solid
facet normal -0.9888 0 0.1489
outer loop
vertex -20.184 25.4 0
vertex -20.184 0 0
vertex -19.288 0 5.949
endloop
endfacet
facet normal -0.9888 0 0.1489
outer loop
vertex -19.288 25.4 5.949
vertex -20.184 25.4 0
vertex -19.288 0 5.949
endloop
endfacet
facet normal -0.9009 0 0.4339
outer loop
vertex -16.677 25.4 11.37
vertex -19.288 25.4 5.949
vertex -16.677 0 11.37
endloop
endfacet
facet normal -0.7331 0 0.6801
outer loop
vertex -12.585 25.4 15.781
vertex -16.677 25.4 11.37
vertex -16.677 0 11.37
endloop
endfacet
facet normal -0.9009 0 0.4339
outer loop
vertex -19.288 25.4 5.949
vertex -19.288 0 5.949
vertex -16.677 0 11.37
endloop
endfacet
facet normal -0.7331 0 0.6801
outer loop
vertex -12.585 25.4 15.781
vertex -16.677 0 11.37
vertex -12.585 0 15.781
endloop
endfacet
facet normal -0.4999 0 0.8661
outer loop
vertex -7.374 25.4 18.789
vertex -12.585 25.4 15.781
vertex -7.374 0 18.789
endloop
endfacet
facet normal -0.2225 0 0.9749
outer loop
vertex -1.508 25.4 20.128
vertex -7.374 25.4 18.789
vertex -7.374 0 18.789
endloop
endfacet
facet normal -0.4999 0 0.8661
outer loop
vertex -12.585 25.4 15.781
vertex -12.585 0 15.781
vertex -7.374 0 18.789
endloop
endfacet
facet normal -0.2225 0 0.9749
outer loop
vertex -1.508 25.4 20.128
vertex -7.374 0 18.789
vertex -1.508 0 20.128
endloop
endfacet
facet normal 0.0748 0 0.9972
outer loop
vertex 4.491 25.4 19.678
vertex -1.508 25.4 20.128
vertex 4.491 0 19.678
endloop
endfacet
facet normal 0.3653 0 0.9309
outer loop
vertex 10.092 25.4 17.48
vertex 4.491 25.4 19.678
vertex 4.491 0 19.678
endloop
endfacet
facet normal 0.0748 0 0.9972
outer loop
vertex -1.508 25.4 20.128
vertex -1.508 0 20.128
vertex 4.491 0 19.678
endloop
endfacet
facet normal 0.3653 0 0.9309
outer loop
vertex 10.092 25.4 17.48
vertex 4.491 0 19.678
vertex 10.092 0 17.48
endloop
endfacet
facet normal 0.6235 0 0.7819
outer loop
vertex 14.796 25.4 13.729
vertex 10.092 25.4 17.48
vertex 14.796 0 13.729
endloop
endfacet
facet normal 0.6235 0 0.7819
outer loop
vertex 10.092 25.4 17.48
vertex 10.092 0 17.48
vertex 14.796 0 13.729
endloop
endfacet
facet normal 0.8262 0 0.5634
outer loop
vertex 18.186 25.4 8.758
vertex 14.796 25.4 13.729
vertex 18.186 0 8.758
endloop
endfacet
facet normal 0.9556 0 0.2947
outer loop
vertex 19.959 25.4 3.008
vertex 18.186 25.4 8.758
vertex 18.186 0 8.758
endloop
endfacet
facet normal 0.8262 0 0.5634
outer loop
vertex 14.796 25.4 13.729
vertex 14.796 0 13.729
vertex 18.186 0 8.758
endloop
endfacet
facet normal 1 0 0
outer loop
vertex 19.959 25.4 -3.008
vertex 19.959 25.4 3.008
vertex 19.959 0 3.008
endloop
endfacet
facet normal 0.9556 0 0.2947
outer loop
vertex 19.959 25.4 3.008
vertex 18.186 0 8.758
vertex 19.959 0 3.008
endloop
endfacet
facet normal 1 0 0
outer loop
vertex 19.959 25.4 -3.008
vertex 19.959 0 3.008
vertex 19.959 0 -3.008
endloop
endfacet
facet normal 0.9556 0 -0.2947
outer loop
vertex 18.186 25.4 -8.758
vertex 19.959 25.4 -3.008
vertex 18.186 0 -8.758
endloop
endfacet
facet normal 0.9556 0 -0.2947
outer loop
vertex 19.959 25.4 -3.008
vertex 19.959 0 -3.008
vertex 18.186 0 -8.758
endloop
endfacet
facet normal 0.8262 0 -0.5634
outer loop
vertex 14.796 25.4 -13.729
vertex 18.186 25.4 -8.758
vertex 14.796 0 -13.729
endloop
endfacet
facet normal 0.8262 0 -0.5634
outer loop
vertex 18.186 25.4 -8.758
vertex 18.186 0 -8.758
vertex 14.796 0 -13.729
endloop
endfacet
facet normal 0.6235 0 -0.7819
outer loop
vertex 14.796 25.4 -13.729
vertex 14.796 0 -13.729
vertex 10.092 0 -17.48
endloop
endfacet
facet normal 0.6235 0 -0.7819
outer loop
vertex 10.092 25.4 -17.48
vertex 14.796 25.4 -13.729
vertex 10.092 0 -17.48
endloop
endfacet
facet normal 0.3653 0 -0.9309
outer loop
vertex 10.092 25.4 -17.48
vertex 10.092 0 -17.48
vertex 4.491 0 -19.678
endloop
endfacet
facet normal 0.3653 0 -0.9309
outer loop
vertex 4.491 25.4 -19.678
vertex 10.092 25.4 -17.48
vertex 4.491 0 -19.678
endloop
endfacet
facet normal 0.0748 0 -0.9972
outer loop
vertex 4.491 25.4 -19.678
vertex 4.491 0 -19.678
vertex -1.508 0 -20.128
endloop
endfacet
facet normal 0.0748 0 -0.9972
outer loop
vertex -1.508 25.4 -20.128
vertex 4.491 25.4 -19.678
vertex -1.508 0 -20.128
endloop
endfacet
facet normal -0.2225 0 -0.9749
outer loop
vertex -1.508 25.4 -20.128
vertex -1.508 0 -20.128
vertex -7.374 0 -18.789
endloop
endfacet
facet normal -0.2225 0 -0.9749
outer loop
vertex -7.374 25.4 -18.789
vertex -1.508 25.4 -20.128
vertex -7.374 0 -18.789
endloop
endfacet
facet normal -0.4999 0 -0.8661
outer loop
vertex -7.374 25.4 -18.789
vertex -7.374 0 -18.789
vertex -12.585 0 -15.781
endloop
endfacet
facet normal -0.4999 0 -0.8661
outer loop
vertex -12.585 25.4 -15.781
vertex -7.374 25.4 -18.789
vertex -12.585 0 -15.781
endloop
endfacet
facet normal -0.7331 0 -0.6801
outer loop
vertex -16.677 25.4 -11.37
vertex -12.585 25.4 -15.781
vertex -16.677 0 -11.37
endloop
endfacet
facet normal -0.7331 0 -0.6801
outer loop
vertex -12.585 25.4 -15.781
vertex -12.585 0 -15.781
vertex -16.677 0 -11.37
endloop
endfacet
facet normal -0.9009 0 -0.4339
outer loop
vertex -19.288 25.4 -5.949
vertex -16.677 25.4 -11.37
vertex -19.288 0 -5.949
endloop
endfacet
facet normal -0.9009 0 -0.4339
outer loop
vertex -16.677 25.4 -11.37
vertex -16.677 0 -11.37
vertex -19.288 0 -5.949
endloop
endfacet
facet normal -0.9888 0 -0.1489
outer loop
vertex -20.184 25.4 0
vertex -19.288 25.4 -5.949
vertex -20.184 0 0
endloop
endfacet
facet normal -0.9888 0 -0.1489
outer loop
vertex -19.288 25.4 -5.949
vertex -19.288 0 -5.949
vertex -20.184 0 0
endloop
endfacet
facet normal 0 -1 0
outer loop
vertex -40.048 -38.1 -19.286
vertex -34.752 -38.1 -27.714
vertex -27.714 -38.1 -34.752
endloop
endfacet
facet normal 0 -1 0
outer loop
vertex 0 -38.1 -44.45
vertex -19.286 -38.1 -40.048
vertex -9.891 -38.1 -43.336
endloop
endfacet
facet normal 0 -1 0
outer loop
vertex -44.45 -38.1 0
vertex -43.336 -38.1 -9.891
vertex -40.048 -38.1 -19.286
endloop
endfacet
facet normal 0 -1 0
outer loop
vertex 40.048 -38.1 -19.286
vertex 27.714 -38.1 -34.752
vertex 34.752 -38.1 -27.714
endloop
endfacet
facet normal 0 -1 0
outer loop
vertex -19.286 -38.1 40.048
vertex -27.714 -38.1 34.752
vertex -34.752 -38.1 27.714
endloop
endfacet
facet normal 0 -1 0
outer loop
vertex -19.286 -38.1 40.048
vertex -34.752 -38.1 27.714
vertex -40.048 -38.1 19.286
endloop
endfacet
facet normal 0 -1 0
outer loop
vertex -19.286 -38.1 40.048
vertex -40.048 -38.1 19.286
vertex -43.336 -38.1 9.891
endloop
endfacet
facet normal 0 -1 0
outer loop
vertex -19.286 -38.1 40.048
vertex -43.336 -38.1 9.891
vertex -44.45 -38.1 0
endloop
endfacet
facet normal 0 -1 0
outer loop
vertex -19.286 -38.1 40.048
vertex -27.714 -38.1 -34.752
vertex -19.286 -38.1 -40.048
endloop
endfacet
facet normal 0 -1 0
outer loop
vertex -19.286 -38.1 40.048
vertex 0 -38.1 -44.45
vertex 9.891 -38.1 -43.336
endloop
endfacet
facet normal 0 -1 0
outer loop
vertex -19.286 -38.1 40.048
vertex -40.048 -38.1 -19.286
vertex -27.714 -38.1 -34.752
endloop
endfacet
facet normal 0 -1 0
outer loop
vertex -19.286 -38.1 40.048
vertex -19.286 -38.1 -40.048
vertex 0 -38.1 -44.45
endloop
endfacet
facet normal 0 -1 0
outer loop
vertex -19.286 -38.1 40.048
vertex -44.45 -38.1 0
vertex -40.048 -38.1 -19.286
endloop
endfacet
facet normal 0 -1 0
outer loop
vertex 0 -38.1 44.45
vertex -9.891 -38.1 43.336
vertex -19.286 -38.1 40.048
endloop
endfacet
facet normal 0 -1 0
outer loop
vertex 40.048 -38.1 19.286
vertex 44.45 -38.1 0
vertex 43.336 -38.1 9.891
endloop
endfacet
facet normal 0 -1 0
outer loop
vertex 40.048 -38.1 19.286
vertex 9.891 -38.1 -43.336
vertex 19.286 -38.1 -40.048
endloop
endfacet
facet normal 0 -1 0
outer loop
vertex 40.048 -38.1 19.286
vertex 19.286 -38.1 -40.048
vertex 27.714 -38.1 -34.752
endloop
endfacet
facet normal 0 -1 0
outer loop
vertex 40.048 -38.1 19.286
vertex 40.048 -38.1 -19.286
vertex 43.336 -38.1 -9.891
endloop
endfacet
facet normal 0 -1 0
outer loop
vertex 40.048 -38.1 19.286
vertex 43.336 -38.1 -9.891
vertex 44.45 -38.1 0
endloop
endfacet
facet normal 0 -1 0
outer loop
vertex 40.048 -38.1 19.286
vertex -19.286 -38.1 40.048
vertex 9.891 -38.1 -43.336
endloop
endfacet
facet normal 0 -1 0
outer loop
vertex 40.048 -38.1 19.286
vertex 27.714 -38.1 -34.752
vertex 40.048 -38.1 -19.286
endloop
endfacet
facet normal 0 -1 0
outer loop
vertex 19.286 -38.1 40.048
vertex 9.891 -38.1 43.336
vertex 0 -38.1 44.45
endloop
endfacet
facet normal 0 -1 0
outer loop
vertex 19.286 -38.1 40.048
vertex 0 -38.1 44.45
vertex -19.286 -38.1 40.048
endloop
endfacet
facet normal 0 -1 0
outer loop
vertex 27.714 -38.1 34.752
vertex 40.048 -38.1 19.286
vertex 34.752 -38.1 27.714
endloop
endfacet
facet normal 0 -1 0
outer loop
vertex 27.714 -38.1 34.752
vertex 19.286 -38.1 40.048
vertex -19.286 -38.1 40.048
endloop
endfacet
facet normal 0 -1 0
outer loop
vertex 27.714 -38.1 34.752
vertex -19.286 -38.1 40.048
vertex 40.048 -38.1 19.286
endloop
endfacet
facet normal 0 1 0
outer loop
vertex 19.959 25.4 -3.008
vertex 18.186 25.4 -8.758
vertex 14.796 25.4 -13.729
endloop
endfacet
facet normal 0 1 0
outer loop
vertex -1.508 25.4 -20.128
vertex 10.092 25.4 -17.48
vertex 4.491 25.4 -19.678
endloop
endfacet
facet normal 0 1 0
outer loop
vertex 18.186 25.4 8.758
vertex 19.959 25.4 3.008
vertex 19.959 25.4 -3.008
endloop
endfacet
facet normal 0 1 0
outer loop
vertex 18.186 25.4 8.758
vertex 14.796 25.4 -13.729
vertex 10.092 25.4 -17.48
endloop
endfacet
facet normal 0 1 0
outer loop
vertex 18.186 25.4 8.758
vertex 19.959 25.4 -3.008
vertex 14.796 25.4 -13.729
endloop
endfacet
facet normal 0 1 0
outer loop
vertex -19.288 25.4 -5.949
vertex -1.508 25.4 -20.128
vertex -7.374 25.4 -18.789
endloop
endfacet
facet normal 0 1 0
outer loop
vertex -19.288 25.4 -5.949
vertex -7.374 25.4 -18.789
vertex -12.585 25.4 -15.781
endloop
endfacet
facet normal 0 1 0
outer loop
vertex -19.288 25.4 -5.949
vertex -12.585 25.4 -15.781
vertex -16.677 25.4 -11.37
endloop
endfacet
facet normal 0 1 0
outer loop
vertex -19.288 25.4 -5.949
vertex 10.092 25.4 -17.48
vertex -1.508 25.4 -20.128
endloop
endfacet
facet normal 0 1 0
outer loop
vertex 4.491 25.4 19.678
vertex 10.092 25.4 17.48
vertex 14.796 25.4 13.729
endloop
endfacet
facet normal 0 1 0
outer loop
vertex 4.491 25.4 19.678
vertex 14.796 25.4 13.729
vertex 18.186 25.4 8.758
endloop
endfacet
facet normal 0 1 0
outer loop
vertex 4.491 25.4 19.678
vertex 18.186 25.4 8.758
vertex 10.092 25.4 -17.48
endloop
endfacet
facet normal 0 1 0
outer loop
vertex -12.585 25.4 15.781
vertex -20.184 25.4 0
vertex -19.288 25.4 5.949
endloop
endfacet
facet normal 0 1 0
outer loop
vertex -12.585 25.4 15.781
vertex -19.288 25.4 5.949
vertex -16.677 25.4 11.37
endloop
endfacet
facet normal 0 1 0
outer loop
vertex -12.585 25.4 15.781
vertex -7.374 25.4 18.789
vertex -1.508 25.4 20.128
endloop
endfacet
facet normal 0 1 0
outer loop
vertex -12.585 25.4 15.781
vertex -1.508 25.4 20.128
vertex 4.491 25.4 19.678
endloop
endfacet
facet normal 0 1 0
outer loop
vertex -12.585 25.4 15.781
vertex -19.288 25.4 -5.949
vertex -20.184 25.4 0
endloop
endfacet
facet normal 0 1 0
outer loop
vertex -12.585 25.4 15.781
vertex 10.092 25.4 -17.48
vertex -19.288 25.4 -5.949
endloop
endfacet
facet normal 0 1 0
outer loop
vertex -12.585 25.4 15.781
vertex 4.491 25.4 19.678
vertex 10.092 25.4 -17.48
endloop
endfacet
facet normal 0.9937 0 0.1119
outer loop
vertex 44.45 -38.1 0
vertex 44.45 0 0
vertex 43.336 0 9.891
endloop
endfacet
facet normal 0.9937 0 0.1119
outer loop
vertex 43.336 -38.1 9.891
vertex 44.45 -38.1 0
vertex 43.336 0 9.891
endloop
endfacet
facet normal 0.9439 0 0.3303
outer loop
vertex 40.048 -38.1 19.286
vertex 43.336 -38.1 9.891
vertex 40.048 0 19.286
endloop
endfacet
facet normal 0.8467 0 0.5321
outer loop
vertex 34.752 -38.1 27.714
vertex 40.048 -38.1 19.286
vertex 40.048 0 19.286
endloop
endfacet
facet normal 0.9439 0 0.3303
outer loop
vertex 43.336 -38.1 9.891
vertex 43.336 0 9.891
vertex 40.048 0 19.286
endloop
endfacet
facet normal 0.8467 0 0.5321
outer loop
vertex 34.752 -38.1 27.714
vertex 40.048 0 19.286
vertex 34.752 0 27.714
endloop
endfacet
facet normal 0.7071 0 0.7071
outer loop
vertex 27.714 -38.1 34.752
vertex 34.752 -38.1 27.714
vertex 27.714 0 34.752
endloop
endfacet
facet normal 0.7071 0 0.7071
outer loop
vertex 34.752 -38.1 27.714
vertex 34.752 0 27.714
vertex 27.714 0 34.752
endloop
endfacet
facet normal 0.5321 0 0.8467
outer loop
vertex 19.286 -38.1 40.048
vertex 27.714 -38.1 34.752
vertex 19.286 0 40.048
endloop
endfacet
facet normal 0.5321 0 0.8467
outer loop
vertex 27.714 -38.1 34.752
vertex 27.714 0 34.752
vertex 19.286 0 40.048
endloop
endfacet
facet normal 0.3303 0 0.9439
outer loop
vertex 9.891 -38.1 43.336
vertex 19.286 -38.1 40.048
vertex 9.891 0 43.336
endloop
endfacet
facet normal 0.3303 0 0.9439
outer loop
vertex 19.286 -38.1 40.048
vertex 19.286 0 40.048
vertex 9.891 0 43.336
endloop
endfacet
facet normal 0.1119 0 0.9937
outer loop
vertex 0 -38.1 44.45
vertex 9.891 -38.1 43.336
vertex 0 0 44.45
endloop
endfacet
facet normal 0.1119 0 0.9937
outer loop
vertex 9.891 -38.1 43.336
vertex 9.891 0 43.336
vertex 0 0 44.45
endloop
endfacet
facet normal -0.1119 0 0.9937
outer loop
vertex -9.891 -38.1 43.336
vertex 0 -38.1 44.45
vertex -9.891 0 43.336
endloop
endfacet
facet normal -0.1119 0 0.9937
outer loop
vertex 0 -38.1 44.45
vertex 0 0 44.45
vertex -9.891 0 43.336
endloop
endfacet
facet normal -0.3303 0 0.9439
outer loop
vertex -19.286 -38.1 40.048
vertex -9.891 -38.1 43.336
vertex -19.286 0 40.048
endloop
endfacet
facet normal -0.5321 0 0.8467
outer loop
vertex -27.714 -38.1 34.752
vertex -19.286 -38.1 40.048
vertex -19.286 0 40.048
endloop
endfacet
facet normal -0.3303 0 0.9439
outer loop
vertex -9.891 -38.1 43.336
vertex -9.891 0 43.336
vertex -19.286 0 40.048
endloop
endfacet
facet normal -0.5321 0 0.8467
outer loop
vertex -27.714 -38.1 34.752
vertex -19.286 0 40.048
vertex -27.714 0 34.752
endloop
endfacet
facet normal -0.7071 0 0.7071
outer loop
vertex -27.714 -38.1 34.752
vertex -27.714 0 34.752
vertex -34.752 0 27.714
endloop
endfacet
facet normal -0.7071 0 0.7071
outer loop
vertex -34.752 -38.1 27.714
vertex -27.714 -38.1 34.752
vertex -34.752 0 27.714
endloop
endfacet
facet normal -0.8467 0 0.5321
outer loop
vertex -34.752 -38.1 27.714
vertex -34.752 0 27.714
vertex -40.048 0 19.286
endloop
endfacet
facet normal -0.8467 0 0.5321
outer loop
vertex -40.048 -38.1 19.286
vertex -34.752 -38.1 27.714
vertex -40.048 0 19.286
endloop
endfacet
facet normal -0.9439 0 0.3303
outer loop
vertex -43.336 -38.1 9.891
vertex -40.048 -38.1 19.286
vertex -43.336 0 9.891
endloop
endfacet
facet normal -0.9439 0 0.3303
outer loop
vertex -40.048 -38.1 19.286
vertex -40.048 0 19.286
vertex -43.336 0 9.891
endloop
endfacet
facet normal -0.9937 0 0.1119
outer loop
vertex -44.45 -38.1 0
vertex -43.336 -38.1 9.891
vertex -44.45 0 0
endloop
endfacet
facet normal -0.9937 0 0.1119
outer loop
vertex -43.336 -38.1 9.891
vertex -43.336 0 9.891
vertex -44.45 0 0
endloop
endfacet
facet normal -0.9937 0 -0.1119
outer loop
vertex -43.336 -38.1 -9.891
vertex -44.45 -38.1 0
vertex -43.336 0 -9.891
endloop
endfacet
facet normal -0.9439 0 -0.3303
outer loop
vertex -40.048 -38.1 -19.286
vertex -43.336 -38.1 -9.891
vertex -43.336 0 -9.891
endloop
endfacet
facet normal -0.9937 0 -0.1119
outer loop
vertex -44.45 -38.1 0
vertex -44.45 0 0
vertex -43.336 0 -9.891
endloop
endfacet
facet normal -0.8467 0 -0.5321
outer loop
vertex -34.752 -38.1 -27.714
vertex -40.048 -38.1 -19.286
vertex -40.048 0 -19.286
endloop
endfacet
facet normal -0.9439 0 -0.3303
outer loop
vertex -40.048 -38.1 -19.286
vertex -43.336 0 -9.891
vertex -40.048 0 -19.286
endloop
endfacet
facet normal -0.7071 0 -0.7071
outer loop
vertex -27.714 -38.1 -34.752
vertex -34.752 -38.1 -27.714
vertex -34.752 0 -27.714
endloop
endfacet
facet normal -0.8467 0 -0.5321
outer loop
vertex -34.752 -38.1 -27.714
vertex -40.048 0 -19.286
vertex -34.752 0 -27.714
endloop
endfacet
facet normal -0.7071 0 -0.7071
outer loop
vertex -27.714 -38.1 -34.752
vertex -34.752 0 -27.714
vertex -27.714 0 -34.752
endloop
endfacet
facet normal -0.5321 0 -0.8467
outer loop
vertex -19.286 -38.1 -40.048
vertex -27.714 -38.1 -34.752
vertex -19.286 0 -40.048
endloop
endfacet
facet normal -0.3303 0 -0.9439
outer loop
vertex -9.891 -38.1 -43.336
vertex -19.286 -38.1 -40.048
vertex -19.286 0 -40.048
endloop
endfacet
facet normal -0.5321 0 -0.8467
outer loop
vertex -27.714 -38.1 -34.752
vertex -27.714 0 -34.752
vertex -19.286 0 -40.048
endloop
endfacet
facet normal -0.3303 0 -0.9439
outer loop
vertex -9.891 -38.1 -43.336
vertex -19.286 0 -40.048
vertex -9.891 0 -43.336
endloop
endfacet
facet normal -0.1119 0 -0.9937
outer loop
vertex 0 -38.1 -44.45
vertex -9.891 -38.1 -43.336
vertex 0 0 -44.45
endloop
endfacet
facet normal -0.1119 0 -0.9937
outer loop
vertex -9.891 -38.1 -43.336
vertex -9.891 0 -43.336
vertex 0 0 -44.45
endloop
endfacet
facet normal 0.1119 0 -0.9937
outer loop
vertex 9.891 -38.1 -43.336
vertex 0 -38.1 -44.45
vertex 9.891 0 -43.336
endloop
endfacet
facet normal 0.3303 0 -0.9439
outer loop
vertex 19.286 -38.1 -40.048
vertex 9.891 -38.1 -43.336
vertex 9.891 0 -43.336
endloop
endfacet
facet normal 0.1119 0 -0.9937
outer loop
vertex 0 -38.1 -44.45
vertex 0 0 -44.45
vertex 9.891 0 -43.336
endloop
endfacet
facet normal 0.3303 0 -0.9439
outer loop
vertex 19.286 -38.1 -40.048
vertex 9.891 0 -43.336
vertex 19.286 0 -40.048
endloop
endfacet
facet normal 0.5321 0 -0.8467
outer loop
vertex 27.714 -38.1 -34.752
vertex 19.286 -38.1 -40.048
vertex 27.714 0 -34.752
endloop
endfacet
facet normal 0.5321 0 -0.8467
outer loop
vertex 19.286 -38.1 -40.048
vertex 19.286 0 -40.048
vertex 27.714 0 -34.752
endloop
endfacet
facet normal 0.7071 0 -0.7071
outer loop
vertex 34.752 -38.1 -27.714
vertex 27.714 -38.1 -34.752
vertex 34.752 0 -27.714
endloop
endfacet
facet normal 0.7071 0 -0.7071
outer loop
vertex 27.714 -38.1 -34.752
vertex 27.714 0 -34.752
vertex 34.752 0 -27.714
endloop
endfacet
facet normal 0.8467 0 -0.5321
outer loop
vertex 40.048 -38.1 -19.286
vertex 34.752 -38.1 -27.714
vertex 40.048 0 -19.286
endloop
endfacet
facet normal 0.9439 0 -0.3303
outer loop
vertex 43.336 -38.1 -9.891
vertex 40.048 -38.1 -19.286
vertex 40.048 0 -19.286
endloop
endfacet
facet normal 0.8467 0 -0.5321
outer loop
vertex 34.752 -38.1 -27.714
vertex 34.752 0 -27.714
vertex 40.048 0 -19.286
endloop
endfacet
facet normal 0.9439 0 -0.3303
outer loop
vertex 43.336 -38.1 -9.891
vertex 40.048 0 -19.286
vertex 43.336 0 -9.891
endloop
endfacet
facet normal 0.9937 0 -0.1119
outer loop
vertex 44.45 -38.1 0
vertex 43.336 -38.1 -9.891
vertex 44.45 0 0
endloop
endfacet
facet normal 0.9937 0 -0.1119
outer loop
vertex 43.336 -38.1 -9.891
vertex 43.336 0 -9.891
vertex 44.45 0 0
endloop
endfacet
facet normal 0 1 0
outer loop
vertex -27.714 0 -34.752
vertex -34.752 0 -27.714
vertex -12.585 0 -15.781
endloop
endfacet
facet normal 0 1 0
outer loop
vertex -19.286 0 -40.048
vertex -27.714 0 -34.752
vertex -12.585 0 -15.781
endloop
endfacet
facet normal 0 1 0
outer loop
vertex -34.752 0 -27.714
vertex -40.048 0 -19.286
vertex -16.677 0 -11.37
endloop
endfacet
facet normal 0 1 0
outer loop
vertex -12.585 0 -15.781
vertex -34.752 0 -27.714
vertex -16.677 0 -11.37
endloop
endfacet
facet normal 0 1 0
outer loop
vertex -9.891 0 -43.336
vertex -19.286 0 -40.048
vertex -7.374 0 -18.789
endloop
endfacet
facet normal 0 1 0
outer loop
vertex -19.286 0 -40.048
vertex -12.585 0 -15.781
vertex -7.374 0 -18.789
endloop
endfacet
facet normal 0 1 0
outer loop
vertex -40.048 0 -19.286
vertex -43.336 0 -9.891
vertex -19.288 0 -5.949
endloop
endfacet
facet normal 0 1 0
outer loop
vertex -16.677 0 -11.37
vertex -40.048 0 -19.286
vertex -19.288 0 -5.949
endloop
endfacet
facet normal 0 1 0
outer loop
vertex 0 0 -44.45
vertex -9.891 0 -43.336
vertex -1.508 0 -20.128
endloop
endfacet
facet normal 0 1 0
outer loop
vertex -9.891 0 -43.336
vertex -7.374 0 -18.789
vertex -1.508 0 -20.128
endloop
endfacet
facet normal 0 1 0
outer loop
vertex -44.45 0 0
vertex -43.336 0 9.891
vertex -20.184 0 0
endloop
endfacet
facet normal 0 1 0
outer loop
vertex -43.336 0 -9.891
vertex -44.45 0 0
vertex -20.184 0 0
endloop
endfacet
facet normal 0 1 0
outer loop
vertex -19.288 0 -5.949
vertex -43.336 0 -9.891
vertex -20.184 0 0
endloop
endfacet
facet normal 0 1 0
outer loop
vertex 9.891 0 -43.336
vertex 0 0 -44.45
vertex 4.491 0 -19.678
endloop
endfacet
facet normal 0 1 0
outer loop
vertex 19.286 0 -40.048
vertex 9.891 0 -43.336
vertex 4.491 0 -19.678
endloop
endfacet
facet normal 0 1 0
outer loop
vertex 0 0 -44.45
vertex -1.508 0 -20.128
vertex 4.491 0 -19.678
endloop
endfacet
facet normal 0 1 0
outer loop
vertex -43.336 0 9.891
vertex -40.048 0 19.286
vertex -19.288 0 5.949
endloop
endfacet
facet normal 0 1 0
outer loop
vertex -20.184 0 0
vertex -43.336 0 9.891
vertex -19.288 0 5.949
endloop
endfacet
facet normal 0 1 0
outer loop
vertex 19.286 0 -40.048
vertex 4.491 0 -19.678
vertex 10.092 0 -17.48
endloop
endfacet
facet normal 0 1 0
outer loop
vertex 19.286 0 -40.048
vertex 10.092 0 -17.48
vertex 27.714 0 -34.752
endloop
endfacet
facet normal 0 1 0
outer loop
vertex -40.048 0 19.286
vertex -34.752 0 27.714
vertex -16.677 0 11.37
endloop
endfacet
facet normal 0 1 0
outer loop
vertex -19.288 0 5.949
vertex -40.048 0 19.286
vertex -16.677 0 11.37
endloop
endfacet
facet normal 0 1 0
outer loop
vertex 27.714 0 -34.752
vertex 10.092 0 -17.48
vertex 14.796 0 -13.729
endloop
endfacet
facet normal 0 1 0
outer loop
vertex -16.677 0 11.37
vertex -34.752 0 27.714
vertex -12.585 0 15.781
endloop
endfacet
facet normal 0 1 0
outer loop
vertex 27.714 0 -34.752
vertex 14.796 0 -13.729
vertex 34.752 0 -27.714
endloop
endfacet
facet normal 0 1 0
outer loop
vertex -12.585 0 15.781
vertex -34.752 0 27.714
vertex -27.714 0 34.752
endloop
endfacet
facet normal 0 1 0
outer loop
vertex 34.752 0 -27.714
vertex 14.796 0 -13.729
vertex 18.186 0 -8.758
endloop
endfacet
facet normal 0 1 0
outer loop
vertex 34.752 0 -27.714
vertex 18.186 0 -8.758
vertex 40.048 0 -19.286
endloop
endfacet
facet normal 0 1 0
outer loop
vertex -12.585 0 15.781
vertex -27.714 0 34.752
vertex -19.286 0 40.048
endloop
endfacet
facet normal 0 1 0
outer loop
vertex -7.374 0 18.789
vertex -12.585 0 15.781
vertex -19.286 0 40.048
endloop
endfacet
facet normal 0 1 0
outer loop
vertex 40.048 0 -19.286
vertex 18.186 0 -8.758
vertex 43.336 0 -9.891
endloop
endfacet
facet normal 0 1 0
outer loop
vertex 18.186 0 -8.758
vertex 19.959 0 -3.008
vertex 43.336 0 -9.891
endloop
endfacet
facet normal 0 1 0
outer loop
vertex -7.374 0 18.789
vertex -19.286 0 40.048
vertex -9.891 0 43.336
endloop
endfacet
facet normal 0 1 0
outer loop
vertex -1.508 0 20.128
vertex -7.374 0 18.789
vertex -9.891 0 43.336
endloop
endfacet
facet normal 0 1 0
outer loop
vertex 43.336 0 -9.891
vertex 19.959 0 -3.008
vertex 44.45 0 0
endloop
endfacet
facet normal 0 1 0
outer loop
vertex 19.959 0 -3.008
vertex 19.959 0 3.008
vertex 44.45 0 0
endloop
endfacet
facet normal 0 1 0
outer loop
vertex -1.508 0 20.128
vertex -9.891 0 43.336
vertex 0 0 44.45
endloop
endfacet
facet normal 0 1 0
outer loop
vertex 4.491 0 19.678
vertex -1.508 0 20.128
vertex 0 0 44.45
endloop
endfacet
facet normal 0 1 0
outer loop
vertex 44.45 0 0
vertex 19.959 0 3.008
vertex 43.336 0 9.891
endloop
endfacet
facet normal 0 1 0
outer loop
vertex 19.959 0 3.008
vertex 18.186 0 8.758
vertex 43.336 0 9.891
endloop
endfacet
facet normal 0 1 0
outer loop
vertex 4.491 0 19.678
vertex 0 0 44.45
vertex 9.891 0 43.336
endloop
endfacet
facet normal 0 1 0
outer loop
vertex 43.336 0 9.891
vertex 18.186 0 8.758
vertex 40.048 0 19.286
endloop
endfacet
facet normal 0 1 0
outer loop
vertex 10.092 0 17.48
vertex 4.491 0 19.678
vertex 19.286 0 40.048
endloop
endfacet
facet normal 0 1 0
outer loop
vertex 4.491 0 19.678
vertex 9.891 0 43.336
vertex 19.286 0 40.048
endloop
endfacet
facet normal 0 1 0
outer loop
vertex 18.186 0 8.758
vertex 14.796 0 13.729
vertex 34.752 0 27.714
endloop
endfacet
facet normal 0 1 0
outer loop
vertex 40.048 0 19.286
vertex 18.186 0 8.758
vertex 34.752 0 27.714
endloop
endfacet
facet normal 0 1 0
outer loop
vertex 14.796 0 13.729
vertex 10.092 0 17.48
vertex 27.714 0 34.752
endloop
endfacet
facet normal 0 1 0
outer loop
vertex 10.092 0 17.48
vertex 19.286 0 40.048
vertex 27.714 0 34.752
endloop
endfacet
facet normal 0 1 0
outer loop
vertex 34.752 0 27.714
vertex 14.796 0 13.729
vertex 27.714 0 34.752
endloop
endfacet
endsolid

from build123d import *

# Parameters (mm, degrees)
F0_R     = 44.45
F0_R_2   = 31.75
F1_DEPTH = 38.1
F2_R     = 20.184497551
F3_DEPTH = 25.4
F4_R     = 23.9709309674
F5_DEPTH = 25.654


with BuildPart() as f1:
    # F0 (on Front) → F1 (new body)
    with BuildSketch(Plane.XZ):
        Circle(F0_R)
        Circle(F0_R_2, mode=Mode.SUBTRACT)
        Circle(F0_R_2)
    extrude(amount=F1_DEPTH)

    # F2 (on face) → F3 (join)
    with BuildSketch(Plane(origin=(0, 0, 0), x_dir=(-1, 0, 0), z_dir=(0, 1, 0))):
        Circle(F2_R)
    extrude(amount=F3_DEPTH)

    # F4 (on face) → F5 (join)
    with BuildSketch(Plane.XZ.offset(38.1)):
        Circle(F4_R)
    extrude(amount=-F5_DEPTH)


solid = f1.part
